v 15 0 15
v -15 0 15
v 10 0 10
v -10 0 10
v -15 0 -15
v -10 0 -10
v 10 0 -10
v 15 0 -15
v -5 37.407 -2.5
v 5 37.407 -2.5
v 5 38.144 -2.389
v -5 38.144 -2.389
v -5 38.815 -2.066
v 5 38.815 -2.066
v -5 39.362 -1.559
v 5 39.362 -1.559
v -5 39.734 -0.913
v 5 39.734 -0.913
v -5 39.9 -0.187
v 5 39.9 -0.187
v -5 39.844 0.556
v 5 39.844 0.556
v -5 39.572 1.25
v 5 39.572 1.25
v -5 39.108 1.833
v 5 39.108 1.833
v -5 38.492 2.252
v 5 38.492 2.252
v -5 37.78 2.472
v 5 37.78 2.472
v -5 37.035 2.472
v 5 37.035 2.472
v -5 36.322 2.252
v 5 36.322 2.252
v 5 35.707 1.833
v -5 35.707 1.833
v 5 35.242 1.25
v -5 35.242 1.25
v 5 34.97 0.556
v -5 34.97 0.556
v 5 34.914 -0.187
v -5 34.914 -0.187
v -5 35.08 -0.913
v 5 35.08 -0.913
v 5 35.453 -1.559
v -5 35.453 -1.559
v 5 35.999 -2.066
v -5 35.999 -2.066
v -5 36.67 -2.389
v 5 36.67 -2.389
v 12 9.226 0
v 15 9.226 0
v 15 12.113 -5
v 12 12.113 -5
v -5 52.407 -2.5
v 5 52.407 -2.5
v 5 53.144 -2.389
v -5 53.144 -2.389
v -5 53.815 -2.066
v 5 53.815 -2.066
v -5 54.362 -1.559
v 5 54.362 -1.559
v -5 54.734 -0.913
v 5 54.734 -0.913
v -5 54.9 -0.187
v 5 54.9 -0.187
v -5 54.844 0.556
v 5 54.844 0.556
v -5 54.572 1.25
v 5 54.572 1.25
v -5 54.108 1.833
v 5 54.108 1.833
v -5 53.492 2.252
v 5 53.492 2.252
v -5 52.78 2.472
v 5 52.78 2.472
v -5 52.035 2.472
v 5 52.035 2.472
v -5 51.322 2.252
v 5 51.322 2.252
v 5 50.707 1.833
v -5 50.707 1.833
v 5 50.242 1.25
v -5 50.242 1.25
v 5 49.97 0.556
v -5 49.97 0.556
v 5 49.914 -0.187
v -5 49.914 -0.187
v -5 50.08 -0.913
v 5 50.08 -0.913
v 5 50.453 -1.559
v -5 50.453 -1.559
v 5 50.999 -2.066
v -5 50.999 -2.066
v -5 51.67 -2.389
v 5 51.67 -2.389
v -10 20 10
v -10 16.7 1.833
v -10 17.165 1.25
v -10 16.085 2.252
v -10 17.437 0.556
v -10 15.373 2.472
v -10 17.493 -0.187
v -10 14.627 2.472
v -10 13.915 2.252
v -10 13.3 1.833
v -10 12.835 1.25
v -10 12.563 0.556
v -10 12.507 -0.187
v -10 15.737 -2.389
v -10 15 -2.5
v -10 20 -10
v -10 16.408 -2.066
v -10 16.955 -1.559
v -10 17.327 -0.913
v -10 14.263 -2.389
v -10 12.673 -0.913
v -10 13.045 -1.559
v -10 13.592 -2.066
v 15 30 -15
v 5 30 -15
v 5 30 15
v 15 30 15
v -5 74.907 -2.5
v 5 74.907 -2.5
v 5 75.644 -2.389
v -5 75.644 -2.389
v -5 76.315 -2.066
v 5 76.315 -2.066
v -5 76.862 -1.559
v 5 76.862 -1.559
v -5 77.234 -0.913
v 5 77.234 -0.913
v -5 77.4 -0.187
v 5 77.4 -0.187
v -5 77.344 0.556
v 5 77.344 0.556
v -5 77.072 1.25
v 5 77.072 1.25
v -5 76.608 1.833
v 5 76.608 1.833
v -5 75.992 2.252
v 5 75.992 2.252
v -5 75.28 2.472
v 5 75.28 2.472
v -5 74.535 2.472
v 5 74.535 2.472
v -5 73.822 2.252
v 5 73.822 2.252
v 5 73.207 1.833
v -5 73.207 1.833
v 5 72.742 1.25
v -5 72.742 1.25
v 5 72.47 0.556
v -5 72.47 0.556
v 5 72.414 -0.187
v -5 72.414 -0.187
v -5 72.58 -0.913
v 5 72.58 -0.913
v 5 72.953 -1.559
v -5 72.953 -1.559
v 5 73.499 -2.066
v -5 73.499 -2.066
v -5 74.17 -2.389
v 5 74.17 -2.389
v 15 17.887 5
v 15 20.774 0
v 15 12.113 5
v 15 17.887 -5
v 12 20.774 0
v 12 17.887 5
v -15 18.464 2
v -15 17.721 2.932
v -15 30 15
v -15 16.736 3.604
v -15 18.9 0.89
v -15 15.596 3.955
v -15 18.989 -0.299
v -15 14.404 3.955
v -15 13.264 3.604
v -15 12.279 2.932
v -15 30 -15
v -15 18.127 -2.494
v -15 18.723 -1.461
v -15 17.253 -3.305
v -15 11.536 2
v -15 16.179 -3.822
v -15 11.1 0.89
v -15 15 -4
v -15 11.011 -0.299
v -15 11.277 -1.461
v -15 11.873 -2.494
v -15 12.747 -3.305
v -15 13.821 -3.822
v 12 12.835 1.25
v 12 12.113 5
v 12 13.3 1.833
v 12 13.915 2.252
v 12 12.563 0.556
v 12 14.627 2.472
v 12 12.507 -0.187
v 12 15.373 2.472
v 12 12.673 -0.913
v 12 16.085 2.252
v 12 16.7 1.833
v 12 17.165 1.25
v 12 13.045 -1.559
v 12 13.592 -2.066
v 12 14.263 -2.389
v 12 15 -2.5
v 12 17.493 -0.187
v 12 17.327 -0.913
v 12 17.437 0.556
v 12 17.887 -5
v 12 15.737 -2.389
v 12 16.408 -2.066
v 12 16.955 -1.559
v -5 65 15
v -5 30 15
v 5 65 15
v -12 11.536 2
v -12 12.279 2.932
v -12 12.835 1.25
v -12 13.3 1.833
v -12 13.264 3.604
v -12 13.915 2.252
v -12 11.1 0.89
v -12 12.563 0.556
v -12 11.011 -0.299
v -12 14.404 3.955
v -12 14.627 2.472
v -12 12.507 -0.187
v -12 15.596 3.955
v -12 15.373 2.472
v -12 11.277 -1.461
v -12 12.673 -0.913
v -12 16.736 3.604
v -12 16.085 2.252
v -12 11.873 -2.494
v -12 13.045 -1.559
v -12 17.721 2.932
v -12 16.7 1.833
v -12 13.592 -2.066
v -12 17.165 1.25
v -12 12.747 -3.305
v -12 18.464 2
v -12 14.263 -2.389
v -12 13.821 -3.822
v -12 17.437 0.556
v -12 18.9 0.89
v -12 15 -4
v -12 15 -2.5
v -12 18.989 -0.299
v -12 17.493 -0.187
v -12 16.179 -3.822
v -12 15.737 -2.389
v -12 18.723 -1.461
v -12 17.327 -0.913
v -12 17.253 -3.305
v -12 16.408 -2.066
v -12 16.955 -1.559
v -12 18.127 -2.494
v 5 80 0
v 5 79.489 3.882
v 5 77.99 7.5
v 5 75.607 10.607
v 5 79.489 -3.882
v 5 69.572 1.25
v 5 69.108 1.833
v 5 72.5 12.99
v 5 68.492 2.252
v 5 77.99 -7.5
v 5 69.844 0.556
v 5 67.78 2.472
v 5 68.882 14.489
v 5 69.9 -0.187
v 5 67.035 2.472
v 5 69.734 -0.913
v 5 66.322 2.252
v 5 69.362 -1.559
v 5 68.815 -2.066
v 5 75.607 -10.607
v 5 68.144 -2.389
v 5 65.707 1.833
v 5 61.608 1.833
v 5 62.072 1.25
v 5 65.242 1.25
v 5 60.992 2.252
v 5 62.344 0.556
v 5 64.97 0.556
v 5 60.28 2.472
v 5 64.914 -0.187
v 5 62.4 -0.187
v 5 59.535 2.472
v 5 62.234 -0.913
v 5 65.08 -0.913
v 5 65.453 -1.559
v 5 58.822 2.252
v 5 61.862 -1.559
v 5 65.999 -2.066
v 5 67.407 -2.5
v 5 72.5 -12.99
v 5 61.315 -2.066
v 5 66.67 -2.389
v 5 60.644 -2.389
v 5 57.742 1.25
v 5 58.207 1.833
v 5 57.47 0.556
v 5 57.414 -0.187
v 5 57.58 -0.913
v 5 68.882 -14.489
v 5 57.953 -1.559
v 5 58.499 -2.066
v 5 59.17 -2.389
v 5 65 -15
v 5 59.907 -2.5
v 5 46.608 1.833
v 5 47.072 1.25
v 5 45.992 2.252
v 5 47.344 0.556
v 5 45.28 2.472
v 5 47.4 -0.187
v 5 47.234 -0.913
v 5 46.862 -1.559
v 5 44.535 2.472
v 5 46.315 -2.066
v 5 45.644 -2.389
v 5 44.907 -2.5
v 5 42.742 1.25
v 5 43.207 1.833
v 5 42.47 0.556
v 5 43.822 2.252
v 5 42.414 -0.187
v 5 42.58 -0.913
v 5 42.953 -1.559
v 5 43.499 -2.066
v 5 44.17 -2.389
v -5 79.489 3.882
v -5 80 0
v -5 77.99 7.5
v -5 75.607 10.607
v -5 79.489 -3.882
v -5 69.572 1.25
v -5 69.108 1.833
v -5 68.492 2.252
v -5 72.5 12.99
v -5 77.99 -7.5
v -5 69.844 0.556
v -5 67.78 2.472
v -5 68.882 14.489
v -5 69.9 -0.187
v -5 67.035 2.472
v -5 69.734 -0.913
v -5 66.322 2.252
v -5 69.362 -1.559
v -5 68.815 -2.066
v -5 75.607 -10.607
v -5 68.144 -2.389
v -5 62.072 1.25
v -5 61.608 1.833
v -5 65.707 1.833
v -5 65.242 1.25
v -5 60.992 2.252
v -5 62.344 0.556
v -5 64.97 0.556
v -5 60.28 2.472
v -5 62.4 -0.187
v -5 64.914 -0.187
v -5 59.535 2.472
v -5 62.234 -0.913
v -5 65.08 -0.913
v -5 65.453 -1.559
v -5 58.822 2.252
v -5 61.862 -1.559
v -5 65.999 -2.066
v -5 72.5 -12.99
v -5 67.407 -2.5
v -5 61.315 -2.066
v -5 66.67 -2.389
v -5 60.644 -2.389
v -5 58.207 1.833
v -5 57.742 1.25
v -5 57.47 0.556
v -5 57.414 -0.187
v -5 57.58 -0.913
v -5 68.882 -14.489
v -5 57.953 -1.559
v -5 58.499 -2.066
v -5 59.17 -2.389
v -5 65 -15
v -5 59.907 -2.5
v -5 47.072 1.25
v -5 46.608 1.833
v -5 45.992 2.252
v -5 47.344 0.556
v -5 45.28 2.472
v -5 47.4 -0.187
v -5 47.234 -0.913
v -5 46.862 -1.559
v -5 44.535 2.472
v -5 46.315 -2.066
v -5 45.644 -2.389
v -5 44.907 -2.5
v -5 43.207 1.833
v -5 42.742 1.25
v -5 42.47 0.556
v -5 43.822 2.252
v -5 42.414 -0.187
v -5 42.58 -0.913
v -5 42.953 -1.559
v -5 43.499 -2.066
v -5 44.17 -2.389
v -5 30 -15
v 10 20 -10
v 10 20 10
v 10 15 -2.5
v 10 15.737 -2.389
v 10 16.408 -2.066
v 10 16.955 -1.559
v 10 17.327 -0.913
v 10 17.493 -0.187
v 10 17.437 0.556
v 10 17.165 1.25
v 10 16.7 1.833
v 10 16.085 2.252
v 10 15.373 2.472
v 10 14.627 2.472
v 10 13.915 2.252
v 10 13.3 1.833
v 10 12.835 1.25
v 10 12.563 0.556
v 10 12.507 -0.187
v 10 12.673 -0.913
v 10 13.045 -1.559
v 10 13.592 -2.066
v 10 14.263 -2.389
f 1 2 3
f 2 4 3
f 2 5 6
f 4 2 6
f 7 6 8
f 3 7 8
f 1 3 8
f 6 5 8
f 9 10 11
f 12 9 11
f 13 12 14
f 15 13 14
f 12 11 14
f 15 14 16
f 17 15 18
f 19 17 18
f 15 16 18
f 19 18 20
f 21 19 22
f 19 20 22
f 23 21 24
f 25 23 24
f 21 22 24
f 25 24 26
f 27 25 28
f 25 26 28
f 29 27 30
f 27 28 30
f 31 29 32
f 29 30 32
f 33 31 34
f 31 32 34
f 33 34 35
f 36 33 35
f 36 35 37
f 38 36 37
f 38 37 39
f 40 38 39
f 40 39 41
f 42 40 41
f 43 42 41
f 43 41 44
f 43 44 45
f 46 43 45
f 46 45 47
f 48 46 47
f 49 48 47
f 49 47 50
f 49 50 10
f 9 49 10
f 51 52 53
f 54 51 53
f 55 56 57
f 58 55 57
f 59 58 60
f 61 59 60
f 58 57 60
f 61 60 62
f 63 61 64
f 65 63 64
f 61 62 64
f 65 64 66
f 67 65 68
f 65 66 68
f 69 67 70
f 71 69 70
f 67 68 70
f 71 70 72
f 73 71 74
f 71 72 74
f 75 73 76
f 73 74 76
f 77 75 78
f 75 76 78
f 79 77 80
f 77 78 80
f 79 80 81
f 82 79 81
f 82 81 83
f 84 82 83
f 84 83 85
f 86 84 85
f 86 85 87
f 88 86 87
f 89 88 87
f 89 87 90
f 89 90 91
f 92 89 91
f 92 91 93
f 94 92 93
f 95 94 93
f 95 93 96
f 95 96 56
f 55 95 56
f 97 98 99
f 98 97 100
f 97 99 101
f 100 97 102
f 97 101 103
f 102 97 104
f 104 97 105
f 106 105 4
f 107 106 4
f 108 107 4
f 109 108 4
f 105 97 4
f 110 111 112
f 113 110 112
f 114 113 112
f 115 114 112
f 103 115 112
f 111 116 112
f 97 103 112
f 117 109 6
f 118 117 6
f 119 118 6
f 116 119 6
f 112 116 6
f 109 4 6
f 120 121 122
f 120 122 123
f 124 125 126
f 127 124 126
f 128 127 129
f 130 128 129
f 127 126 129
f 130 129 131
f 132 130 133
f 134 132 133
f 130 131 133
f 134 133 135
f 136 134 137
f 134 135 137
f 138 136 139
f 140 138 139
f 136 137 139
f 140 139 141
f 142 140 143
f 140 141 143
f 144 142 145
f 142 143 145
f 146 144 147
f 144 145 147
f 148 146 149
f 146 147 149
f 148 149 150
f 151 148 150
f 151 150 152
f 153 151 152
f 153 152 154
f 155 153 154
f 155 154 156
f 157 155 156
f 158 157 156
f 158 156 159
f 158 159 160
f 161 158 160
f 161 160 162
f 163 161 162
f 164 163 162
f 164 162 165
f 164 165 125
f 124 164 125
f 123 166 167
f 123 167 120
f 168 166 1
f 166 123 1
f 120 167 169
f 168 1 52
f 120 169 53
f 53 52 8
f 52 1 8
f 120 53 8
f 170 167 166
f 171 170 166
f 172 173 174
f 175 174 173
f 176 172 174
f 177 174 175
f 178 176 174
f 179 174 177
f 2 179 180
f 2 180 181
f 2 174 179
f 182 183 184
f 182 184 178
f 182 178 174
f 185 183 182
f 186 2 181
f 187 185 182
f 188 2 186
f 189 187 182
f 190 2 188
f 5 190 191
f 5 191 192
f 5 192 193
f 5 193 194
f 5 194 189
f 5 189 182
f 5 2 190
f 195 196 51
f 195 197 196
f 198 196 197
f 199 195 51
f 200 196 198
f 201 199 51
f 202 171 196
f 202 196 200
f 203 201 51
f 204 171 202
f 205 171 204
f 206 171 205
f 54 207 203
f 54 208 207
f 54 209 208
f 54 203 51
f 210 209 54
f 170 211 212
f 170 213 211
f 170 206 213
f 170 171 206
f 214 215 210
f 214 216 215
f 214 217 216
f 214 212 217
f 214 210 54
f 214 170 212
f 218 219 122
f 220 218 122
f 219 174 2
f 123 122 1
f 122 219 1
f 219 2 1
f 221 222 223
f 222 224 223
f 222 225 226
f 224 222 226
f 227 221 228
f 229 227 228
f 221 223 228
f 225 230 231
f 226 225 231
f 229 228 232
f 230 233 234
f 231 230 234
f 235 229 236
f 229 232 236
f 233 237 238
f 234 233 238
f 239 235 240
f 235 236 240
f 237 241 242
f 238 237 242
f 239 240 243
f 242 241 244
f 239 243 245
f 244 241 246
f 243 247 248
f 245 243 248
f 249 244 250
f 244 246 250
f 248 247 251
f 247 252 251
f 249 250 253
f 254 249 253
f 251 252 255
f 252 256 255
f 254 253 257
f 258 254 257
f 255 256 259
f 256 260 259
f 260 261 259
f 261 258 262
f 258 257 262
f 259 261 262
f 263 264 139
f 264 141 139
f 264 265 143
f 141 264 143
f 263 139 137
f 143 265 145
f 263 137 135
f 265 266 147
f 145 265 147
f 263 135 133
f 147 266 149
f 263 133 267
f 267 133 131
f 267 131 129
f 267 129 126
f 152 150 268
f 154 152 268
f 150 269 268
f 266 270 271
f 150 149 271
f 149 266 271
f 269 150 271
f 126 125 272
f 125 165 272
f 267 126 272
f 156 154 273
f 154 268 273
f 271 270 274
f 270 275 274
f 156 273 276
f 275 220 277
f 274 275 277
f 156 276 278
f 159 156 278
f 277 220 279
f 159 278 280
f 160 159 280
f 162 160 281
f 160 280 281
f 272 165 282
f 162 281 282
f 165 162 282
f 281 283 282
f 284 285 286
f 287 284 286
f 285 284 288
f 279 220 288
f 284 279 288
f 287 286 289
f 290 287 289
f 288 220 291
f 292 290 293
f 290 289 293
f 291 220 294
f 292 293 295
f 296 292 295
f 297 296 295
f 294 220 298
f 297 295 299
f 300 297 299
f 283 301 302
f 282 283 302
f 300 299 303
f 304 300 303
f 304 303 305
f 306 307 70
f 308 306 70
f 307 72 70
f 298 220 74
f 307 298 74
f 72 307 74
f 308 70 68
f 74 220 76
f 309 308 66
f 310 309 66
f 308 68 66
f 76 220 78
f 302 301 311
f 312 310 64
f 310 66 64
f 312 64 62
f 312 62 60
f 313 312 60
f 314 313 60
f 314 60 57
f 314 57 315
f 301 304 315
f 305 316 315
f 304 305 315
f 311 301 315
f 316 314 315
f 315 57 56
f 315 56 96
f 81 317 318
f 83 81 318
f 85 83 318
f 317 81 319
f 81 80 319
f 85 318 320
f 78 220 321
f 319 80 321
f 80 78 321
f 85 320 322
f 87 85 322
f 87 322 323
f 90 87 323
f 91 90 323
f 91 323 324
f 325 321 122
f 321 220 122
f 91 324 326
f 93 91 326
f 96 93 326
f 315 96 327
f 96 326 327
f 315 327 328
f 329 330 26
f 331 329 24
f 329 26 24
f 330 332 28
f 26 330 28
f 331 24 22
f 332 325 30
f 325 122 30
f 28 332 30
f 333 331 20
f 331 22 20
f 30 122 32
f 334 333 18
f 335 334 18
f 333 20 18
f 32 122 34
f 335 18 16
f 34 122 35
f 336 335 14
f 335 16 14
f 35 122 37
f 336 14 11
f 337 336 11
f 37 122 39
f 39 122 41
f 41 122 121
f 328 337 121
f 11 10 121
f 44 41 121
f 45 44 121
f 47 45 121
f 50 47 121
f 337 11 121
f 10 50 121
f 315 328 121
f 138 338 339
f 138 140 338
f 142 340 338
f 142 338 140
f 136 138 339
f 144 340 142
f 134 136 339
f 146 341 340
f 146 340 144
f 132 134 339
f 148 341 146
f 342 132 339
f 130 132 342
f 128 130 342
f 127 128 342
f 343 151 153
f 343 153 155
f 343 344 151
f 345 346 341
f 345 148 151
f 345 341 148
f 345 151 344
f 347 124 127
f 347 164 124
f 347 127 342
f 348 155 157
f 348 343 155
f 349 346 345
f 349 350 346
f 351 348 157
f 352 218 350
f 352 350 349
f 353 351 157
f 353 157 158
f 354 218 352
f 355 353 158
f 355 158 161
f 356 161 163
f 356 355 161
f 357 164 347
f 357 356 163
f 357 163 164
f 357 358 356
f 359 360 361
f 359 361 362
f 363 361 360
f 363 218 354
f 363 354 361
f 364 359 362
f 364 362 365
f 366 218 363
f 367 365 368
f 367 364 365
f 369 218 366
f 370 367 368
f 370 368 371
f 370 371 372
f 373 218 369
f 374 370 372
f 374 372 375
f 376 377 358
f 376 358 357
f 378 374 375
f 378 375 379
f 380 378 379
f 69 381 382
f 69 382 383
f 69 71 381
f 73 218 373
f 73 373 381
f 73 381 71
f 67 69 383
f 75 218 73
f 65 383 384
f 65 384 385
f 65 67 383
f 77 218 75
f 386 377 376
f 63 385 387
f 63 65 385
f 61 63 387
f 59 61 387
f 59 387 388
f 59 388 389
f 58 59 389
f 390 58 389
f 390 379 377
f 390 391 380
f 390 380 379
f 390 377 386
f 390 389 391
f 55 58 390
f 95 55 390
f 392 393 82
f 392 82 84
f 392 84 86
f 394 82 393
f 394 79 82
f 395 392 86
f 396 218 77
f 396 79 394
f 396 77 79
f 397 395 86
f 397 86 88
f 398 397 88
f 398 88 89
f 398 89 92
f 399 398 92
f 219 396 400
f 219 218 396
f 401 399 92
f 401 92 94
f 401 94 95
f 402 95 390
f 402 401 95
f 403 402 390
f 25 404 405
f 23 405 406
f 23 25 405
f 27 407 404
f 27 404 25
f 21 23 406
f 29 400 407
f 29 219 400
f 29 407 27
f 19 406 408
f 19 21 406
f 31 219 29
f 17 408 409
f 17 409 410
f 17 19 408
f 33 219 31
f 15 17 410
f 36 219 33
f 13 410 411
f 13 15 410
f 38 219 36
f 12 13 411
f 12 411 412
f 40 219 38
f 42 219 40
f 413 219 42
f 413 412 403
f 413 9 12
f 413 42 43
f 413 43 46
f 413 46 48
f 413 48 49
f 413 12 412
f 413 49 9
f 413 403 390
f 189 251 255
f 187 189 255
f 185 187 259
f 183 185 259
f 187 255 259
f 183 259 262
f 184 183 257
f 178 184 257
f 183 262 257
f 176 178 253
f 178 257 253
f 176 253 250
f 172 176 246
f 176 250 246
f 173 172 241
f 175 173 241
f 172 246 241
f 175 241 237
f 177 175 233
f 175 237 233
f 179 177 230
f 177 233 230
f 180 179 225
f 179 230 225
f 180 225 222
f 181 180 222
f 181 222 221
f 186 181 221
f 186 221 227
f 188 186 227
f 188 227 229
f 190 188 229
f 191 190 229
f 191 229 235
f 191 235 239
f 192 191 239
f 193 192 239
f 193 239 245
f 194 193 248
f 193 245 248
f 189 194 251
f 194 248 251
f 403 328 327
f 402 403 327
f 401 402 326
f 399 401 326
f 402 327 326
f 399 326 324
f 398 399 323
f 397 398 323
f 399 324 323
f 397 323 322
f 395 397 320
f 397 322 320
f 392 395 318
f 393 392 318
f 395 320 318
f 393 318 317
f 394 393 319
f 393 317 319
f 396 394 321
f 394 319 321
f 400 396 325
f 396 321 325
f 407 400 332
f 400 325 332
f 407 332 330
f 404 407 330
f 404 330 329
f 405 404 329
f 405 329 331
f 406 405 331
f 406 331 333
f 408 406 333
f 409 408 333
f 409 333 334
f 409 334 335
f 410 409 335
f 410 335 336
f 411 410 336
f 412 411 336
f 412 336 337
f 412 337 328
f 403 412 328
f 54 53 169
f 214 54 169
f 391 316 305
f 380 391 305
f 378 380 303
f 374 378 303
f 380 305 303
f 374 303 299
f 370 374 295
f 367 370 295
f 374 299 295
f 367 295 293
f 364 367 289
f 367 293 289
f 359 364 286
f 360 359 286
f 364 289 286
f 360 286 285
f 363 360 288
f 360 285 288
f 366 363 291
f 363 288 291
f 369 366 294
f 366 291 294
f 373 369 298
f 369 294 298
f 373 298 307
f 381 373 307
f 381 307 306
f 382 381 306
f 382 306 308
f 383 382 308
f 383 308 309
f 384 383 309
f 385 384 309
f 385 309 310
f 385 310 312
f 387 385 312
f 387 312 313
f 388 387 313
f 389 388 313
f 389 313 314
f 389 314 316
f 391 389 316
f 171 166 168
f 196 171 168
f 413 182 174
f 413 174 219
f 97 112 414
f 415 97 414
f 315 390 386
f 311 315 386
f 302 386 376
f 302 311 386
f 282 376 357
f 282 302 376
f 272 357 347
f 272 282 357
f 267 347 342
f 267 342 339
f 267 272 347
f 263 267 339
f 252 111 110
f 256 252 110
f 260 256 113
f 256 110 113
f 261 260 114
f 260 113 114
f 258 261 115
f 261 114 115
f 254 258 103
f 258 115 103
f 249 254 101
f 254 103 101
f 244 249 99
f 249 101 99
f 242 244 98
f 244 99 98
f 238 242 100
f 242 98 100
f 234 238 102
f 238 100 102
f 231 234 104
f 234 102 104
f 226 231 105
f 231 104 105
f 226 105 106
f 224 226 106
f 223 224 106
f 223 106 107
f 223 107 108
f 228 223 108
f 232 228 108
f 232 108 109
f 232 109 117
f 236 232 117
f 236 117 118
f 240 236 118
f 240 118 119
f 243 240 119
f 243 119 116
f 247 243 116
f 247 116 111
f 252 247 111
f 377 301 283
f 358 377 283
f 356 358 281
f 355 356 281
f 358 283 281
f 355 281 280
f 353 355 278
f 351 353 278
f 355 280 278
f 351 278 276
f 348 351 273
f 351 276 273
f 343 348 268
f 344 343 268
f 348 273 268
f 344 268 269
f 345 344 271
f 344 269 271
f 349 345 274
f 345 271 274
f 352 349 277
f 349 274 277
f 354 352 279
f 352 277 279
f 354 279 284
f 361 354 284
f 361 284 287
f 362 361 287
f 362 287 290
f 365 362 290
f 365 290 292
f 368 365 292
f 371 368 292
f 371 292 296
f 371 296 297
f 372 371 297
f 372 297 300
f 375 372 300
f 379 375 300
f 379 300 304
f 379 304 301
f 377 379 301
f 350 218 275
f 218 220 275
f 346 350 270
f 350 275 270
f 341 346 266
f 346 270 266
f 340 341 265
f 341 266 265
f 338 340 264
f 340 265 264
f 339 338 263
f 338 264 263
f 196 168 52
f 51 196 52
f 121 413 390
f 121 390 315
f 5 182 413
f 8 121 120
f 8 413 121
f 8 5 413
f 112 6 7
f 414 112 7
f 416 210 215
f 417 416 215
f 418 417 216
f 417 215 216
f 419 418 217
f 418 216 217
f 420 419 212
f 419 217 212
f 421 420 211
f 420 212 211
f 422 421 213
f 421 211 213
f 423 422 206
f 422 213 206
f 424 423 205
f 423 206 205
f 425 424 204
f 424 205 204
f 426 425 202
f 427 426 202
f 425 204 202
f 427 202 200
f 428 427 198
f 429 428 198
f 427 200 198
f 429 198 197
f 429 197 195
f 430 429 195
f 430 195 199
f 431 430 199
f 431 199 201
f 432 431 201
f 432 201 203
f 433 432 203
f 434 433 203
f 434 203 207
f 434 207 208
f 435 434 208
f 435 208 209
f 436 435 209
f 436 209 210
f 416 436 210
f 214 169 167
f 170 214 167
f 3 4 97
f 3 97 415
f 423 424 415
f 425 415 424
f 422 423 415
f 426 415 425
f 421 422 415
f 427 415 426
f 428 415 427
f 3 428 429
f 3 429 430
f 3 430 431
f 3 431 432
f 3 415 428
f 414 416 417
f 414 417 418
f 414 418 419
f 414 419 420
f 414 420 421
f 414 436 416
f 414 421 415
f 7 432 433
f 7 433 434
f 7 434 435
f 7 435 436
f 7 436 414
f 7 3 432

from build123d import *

# Parameters (mm, degrees)
SKETCH1_W           = 30
SKETCH1_H           = 30
SKETCH1_W_2         = 20
SKETCH1_H_2         = 20
BOSS_EXTRUDE1_DEPTH = 20
BOSS_EXTRUDE2_START = 20
SKETCH1_2_W         = 30
SKETCH1_2_H         = 30
SKETCH1_2_W_2       = 20
SKETCH1_2_H_2       = 20
BOSS_EXTRUDE2_DEPTH = 10
SKETCH3_R           = 2.5
CUT_EXTRUDE1_DEPTH  = 46
SKETCH3_3_R         = 4
SKETCH3_3_R_2       = 2.5
CUT_EXTRUDE2_DEPTH  = 3
CUT_EXTRUDE3_START  = -27
SKETCH3_4_R         = 4
SKETCH3_4_R_2       = 2.5
CUT_EXTRUDE3_DEPTH  = 3
SKETCH4_W           = 10
SKETCH4_H           = 30
BOSS_EXTRUDE3_DEPTH = 50
SKETCH5_R           = 2.5
CUT_EXTRUDE4_DEPTH  = 84.815273071
LPATTERN1_COUNT     = 6
LPATTERN1_PITCH     = 7.5
FILLET1_R           = 15


with BuildPart() as part:
    # Sketch1 → Boss-Extrude1 (new body)
    with BuildSketch(Plane(origin=(0, 0, 0), x_dir=(1, 0, 0), z_dir=(0, 1, 0))):
        Rectangle(SKETCH1_W, SKETCH1_H)
        Rectangle(SKETCH1_W_2, SKETCH1_H_2, mode=Mode.SUBTRACT)
    extrude(amount=BOSS_EXTRUDE1_DEPTH)

    # Sketch1<2> → Boss-Extrude2 (add)
    # profile 1 of 2: a face of its own
    with BuildSketch(Plane(origin=(0, 0, 0), x_dir=(1, 0, 0), z_dir=(0, 1, 0)).offset(BOSS_EXTRUDE2_START)):
        Rectangle(SKETCH1_2_W, SKETCH1_2_H)
        Rectangle(SKETCH1_2_W_2, SKETCH1_2_H_2, mode=Mode.SUBTRACT)
    # profile 2 of 2: a face of its own
    with BuildSketch(Plane(origin=(0, 0, 0), x_dir=(1, 0, 0), z_dir=(0, 1, 0)).offset(BOSS_EXTRUDE2_START)):
        Rectangle(SKETCH1_2_W_2, SKETCH1_2_H_2)
    extrude(amount=BOSS_EXTRUDE2_DEPTH)

    # Sketch3 → Cut-Extrude1 (cut, through all)
    with BuildSketch(Plane(origin=(15, 0, 0), x_dir=(0, 0, -1), z_dir=(1, 0, 0))):
        with Locations((0, 15)):
            Circle(SKETCH3_R)
    extrude(amount=-CUT_EXTRUDE1_DEPTH, mode=Mode.SUBTRACT)

    # Sketch3<3> → Cut-Extrude2 (cut)
    # profile 1 of 2: a face of its own
    with BuildSketch(Plane(origin=(15, 0, 0), x_dir=(0, 0, -1), z_dir=(1, 0, 0))):
        Polygon((-5, 17.886751346), (-5, 12.113248654), (0, 9.226497308), (5, 12.113248654), (5, 17.886751346), (0, 20.773502692), align=None)
        with Locations((0, 15)):
            Circle(SKETCH3_3_R, mode=Mode.SUBTRACT)
    # profile 2 of 2: a face of its own
    with BuildSketch(Plane(origin=(15, 0, 0), x_dir=(0, 0, -1), z_dir=(1, 0, 0))):
        with Locations((0, 15)):
            Circle(SKETCH3_3_R)
        with Locations((0, 15)):
            Circle(SKETCH3_3_R_2, mode=Mode.SUBTRACT)
    extrude(amount=-CUT_EXTRUDE2_DEPTH, mode=Mode.SUBTRACT)

    # Sketch3<4> → Cut-Extrude3 (cut)
    with BuildSketch(Plane(origin=(15, 0, 0), x_dir=(0, 0, -1), z_dir=(1, 0, 0)).offset(CUT_EXTRUDE3_START)):
        with Locations((0, 15)):
            Circle(SKETCH3_4_R)
        with Locations((0, 15)):
            Circle(SKETCH3_4_R_2, mode=Mode.SUBTRACT)
    extrude(amount=-CUT_EXTRUDE3_DEPTH, mode=Mode.SUBTRACT)

    # Sketch4 → Boss-Extrude3 (add)
    with BuildSketch(Plane(origin=(0, 30, 0), x_dir=(1, 0, 0), z_dir=(0, 1, 0))):
        Rectangle(SKETCH4_W, SKETCH4_H)
    extrude(amount=BOSS_EXTRUDE3_DEPTH)

    # Sketch5 → Cut-Extrude4 (cut, through all)
    with BuildSketch(Plane(origin=(5, 0, 0), x_dir=(0, 0, -1), z_dir=(1, 0, 0))):
        with Locations((0, 37.407153601)):
            Circle(SKETCH5_R)
    cut_extrude4 = extrude(amount=-CUT_EXTRUDE4_DEPTH, mode=Mode.SUBTRACT)

    # LPattern1: Cut-Extrude4 ×6
    with Locations(*[(0, i * LPATTERN1_PITCH, 0) for i in range(1, LPATTERN1_COUNT)]):
        add(cut_extrude4, mode=Mode.SUBTRACT)

    # Fillet1
    fillet1_edges = [part.edges().sort_by_distance(p)[0] for p in [
        (0, 80, -15),
        (0, 80, 15),
    ]]
    fillet(fillet1_edges, radius=FILLET1_R - 0.0001)  # a hair under: the kernel refuses the full size


solid = part.part
